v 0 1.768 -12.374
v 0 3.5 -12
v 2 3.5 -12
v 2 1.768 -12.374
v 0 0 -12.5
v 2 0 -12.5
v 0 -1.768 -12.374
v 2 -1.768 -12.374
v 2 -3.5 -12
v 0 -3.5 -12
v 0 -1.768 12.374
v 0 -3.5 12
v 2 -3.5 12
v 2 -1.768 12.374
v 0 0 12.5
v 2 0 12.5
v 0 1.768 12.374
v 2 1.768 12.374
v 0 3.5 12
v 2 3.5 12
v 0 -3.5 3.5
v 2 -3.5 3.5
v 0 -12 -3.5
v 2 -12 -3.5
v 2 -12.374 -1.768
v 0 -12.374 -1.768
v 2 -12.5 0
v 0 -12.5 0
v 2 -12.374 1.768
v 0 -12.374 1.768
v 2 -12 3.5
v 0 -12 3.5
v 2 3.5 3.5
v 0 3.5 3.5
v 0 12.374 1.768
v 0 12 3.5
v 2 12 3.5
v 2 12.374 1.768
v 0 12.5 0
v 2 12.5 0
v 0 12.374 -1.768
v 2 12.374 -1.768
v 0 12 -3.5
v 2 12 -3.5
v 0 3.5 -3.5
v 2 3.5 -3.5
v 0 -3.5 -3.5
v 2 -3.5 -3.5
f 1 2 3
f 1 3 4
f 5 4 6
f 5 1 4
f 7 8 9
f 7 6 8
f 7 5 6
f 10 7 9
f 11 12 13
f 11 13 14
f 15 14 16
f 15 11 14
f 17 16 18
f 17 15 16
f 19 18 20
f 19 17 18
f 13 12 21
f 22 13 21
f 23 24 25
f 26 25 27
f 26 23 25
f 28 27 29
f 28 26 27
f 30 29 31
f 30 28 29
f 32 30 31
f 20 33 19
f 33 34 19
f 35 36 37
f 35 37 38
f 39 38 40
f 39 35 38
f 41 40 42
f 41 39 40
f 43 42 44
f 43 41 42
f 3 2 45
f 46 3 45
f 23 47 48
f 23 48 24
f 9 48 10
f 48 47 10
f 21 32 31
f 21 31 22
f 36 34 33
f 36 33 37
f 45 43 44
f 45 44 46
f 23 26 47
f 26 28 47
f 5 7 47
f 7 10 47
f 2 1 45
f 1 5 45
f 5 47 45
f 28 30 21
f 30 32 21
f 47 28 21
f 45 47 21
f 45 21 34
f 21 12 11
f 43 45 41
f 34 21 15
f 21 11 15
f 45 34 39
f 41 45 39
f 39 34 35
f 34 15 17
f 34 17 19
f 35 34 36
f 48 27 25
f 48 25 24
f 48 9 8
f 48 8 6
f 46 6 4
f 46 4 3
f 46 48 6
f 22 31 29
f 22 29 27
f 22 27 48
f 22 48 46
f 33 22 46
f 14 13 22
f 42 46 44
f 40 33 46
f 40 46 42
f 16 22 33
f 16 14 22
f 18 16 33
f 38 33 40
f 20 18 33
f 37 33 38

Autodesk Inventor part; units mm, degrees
ref_plane "YZ Plane" through (0, 0, 0) normal (1, 0, 0) x (0, 1, 0)
ref_plane "XZ Plane" through (0, 0, 0) normal (0, 1, 0) x (-1, 0, 0)
ref_plane "XY Plane" through (0, 0, 0) normal (0, 0, 1) x (1, 0, 0)
sketch "スケッチ1" plane through (0, 0, 0) normal (1, 0, 0) x (0, 1, 0)
  circle A0 centre (0, 0) radius 10
  circle A1 centre (0, 0) radius 12.5
  line L0 (3.5, 12.5) -> (-3.5, 12.5)
  line L1 (-3.5, 12.5) -> (-3.5, -12.5)
  line L2 (-3.5, -12.5) -> (3.5, -12.5)
  line L3 (3.5, -12.5) -> (3.5, 12.5)
  line L4 (3.5, 12.5) -> (-3.5, -12.5) construction
  line L5 (-3.5, 12.5) -> (3.5, -12.5) construction
  line L6 (-12.5, 3.5) -> (12.5, 3.5)
  line L7 (12.5, 3.5) -> (12.5, -3.5)
  line L8 (12.5, -3.5) -> (-12.5, -3.5)
  line L9 (-12.5, -3.5) -> (-12.5, 3.5)
  line L10 (-12.5, 3.5) -> (12.5, -3.5) construction
  line L11 (12.5, 3.5) -> (-12.5, -3.5) construction
  point P0 (12, -3.5)
  point P1 (12, 3.5)
  point P2 (3.5, 3.5)
  point P3 (3.5, 12)
  point P4 (-3.5, 12)
  point P5 (-3.5, 3.5)
  point P6 (-12, 3.5)
  point P7 (-12, -3.5)
  point P8 (-3.5, -3.5)
  point P9 (-3.5, -12)
  point P10 (3.5, -12)
  point P11 (3.5, -3.5)
  dimension "d0" = 20
  dimension "d1" = 25
  dimension "d2" = 7
  dimension "d3" = 25
  dimension "d4" = 25
  dimension "d5" = 7
extrude "押し出し1" add sketch "スケッチ1" along normal blind 2 contours A0 L8 L3 L6 | A0 L6 A1 L8 | L3 L6 L1 A0 | A0 L1 A1 L3 | L3 L8 L1 L6 | L3 A1 L1 A0 | A0 L1 L8 L3 | L1 L8 A0 L6 | A0 L8 A1 L6
equation "\"d5\" = d2"
properties part number "RubberSheet_1"
